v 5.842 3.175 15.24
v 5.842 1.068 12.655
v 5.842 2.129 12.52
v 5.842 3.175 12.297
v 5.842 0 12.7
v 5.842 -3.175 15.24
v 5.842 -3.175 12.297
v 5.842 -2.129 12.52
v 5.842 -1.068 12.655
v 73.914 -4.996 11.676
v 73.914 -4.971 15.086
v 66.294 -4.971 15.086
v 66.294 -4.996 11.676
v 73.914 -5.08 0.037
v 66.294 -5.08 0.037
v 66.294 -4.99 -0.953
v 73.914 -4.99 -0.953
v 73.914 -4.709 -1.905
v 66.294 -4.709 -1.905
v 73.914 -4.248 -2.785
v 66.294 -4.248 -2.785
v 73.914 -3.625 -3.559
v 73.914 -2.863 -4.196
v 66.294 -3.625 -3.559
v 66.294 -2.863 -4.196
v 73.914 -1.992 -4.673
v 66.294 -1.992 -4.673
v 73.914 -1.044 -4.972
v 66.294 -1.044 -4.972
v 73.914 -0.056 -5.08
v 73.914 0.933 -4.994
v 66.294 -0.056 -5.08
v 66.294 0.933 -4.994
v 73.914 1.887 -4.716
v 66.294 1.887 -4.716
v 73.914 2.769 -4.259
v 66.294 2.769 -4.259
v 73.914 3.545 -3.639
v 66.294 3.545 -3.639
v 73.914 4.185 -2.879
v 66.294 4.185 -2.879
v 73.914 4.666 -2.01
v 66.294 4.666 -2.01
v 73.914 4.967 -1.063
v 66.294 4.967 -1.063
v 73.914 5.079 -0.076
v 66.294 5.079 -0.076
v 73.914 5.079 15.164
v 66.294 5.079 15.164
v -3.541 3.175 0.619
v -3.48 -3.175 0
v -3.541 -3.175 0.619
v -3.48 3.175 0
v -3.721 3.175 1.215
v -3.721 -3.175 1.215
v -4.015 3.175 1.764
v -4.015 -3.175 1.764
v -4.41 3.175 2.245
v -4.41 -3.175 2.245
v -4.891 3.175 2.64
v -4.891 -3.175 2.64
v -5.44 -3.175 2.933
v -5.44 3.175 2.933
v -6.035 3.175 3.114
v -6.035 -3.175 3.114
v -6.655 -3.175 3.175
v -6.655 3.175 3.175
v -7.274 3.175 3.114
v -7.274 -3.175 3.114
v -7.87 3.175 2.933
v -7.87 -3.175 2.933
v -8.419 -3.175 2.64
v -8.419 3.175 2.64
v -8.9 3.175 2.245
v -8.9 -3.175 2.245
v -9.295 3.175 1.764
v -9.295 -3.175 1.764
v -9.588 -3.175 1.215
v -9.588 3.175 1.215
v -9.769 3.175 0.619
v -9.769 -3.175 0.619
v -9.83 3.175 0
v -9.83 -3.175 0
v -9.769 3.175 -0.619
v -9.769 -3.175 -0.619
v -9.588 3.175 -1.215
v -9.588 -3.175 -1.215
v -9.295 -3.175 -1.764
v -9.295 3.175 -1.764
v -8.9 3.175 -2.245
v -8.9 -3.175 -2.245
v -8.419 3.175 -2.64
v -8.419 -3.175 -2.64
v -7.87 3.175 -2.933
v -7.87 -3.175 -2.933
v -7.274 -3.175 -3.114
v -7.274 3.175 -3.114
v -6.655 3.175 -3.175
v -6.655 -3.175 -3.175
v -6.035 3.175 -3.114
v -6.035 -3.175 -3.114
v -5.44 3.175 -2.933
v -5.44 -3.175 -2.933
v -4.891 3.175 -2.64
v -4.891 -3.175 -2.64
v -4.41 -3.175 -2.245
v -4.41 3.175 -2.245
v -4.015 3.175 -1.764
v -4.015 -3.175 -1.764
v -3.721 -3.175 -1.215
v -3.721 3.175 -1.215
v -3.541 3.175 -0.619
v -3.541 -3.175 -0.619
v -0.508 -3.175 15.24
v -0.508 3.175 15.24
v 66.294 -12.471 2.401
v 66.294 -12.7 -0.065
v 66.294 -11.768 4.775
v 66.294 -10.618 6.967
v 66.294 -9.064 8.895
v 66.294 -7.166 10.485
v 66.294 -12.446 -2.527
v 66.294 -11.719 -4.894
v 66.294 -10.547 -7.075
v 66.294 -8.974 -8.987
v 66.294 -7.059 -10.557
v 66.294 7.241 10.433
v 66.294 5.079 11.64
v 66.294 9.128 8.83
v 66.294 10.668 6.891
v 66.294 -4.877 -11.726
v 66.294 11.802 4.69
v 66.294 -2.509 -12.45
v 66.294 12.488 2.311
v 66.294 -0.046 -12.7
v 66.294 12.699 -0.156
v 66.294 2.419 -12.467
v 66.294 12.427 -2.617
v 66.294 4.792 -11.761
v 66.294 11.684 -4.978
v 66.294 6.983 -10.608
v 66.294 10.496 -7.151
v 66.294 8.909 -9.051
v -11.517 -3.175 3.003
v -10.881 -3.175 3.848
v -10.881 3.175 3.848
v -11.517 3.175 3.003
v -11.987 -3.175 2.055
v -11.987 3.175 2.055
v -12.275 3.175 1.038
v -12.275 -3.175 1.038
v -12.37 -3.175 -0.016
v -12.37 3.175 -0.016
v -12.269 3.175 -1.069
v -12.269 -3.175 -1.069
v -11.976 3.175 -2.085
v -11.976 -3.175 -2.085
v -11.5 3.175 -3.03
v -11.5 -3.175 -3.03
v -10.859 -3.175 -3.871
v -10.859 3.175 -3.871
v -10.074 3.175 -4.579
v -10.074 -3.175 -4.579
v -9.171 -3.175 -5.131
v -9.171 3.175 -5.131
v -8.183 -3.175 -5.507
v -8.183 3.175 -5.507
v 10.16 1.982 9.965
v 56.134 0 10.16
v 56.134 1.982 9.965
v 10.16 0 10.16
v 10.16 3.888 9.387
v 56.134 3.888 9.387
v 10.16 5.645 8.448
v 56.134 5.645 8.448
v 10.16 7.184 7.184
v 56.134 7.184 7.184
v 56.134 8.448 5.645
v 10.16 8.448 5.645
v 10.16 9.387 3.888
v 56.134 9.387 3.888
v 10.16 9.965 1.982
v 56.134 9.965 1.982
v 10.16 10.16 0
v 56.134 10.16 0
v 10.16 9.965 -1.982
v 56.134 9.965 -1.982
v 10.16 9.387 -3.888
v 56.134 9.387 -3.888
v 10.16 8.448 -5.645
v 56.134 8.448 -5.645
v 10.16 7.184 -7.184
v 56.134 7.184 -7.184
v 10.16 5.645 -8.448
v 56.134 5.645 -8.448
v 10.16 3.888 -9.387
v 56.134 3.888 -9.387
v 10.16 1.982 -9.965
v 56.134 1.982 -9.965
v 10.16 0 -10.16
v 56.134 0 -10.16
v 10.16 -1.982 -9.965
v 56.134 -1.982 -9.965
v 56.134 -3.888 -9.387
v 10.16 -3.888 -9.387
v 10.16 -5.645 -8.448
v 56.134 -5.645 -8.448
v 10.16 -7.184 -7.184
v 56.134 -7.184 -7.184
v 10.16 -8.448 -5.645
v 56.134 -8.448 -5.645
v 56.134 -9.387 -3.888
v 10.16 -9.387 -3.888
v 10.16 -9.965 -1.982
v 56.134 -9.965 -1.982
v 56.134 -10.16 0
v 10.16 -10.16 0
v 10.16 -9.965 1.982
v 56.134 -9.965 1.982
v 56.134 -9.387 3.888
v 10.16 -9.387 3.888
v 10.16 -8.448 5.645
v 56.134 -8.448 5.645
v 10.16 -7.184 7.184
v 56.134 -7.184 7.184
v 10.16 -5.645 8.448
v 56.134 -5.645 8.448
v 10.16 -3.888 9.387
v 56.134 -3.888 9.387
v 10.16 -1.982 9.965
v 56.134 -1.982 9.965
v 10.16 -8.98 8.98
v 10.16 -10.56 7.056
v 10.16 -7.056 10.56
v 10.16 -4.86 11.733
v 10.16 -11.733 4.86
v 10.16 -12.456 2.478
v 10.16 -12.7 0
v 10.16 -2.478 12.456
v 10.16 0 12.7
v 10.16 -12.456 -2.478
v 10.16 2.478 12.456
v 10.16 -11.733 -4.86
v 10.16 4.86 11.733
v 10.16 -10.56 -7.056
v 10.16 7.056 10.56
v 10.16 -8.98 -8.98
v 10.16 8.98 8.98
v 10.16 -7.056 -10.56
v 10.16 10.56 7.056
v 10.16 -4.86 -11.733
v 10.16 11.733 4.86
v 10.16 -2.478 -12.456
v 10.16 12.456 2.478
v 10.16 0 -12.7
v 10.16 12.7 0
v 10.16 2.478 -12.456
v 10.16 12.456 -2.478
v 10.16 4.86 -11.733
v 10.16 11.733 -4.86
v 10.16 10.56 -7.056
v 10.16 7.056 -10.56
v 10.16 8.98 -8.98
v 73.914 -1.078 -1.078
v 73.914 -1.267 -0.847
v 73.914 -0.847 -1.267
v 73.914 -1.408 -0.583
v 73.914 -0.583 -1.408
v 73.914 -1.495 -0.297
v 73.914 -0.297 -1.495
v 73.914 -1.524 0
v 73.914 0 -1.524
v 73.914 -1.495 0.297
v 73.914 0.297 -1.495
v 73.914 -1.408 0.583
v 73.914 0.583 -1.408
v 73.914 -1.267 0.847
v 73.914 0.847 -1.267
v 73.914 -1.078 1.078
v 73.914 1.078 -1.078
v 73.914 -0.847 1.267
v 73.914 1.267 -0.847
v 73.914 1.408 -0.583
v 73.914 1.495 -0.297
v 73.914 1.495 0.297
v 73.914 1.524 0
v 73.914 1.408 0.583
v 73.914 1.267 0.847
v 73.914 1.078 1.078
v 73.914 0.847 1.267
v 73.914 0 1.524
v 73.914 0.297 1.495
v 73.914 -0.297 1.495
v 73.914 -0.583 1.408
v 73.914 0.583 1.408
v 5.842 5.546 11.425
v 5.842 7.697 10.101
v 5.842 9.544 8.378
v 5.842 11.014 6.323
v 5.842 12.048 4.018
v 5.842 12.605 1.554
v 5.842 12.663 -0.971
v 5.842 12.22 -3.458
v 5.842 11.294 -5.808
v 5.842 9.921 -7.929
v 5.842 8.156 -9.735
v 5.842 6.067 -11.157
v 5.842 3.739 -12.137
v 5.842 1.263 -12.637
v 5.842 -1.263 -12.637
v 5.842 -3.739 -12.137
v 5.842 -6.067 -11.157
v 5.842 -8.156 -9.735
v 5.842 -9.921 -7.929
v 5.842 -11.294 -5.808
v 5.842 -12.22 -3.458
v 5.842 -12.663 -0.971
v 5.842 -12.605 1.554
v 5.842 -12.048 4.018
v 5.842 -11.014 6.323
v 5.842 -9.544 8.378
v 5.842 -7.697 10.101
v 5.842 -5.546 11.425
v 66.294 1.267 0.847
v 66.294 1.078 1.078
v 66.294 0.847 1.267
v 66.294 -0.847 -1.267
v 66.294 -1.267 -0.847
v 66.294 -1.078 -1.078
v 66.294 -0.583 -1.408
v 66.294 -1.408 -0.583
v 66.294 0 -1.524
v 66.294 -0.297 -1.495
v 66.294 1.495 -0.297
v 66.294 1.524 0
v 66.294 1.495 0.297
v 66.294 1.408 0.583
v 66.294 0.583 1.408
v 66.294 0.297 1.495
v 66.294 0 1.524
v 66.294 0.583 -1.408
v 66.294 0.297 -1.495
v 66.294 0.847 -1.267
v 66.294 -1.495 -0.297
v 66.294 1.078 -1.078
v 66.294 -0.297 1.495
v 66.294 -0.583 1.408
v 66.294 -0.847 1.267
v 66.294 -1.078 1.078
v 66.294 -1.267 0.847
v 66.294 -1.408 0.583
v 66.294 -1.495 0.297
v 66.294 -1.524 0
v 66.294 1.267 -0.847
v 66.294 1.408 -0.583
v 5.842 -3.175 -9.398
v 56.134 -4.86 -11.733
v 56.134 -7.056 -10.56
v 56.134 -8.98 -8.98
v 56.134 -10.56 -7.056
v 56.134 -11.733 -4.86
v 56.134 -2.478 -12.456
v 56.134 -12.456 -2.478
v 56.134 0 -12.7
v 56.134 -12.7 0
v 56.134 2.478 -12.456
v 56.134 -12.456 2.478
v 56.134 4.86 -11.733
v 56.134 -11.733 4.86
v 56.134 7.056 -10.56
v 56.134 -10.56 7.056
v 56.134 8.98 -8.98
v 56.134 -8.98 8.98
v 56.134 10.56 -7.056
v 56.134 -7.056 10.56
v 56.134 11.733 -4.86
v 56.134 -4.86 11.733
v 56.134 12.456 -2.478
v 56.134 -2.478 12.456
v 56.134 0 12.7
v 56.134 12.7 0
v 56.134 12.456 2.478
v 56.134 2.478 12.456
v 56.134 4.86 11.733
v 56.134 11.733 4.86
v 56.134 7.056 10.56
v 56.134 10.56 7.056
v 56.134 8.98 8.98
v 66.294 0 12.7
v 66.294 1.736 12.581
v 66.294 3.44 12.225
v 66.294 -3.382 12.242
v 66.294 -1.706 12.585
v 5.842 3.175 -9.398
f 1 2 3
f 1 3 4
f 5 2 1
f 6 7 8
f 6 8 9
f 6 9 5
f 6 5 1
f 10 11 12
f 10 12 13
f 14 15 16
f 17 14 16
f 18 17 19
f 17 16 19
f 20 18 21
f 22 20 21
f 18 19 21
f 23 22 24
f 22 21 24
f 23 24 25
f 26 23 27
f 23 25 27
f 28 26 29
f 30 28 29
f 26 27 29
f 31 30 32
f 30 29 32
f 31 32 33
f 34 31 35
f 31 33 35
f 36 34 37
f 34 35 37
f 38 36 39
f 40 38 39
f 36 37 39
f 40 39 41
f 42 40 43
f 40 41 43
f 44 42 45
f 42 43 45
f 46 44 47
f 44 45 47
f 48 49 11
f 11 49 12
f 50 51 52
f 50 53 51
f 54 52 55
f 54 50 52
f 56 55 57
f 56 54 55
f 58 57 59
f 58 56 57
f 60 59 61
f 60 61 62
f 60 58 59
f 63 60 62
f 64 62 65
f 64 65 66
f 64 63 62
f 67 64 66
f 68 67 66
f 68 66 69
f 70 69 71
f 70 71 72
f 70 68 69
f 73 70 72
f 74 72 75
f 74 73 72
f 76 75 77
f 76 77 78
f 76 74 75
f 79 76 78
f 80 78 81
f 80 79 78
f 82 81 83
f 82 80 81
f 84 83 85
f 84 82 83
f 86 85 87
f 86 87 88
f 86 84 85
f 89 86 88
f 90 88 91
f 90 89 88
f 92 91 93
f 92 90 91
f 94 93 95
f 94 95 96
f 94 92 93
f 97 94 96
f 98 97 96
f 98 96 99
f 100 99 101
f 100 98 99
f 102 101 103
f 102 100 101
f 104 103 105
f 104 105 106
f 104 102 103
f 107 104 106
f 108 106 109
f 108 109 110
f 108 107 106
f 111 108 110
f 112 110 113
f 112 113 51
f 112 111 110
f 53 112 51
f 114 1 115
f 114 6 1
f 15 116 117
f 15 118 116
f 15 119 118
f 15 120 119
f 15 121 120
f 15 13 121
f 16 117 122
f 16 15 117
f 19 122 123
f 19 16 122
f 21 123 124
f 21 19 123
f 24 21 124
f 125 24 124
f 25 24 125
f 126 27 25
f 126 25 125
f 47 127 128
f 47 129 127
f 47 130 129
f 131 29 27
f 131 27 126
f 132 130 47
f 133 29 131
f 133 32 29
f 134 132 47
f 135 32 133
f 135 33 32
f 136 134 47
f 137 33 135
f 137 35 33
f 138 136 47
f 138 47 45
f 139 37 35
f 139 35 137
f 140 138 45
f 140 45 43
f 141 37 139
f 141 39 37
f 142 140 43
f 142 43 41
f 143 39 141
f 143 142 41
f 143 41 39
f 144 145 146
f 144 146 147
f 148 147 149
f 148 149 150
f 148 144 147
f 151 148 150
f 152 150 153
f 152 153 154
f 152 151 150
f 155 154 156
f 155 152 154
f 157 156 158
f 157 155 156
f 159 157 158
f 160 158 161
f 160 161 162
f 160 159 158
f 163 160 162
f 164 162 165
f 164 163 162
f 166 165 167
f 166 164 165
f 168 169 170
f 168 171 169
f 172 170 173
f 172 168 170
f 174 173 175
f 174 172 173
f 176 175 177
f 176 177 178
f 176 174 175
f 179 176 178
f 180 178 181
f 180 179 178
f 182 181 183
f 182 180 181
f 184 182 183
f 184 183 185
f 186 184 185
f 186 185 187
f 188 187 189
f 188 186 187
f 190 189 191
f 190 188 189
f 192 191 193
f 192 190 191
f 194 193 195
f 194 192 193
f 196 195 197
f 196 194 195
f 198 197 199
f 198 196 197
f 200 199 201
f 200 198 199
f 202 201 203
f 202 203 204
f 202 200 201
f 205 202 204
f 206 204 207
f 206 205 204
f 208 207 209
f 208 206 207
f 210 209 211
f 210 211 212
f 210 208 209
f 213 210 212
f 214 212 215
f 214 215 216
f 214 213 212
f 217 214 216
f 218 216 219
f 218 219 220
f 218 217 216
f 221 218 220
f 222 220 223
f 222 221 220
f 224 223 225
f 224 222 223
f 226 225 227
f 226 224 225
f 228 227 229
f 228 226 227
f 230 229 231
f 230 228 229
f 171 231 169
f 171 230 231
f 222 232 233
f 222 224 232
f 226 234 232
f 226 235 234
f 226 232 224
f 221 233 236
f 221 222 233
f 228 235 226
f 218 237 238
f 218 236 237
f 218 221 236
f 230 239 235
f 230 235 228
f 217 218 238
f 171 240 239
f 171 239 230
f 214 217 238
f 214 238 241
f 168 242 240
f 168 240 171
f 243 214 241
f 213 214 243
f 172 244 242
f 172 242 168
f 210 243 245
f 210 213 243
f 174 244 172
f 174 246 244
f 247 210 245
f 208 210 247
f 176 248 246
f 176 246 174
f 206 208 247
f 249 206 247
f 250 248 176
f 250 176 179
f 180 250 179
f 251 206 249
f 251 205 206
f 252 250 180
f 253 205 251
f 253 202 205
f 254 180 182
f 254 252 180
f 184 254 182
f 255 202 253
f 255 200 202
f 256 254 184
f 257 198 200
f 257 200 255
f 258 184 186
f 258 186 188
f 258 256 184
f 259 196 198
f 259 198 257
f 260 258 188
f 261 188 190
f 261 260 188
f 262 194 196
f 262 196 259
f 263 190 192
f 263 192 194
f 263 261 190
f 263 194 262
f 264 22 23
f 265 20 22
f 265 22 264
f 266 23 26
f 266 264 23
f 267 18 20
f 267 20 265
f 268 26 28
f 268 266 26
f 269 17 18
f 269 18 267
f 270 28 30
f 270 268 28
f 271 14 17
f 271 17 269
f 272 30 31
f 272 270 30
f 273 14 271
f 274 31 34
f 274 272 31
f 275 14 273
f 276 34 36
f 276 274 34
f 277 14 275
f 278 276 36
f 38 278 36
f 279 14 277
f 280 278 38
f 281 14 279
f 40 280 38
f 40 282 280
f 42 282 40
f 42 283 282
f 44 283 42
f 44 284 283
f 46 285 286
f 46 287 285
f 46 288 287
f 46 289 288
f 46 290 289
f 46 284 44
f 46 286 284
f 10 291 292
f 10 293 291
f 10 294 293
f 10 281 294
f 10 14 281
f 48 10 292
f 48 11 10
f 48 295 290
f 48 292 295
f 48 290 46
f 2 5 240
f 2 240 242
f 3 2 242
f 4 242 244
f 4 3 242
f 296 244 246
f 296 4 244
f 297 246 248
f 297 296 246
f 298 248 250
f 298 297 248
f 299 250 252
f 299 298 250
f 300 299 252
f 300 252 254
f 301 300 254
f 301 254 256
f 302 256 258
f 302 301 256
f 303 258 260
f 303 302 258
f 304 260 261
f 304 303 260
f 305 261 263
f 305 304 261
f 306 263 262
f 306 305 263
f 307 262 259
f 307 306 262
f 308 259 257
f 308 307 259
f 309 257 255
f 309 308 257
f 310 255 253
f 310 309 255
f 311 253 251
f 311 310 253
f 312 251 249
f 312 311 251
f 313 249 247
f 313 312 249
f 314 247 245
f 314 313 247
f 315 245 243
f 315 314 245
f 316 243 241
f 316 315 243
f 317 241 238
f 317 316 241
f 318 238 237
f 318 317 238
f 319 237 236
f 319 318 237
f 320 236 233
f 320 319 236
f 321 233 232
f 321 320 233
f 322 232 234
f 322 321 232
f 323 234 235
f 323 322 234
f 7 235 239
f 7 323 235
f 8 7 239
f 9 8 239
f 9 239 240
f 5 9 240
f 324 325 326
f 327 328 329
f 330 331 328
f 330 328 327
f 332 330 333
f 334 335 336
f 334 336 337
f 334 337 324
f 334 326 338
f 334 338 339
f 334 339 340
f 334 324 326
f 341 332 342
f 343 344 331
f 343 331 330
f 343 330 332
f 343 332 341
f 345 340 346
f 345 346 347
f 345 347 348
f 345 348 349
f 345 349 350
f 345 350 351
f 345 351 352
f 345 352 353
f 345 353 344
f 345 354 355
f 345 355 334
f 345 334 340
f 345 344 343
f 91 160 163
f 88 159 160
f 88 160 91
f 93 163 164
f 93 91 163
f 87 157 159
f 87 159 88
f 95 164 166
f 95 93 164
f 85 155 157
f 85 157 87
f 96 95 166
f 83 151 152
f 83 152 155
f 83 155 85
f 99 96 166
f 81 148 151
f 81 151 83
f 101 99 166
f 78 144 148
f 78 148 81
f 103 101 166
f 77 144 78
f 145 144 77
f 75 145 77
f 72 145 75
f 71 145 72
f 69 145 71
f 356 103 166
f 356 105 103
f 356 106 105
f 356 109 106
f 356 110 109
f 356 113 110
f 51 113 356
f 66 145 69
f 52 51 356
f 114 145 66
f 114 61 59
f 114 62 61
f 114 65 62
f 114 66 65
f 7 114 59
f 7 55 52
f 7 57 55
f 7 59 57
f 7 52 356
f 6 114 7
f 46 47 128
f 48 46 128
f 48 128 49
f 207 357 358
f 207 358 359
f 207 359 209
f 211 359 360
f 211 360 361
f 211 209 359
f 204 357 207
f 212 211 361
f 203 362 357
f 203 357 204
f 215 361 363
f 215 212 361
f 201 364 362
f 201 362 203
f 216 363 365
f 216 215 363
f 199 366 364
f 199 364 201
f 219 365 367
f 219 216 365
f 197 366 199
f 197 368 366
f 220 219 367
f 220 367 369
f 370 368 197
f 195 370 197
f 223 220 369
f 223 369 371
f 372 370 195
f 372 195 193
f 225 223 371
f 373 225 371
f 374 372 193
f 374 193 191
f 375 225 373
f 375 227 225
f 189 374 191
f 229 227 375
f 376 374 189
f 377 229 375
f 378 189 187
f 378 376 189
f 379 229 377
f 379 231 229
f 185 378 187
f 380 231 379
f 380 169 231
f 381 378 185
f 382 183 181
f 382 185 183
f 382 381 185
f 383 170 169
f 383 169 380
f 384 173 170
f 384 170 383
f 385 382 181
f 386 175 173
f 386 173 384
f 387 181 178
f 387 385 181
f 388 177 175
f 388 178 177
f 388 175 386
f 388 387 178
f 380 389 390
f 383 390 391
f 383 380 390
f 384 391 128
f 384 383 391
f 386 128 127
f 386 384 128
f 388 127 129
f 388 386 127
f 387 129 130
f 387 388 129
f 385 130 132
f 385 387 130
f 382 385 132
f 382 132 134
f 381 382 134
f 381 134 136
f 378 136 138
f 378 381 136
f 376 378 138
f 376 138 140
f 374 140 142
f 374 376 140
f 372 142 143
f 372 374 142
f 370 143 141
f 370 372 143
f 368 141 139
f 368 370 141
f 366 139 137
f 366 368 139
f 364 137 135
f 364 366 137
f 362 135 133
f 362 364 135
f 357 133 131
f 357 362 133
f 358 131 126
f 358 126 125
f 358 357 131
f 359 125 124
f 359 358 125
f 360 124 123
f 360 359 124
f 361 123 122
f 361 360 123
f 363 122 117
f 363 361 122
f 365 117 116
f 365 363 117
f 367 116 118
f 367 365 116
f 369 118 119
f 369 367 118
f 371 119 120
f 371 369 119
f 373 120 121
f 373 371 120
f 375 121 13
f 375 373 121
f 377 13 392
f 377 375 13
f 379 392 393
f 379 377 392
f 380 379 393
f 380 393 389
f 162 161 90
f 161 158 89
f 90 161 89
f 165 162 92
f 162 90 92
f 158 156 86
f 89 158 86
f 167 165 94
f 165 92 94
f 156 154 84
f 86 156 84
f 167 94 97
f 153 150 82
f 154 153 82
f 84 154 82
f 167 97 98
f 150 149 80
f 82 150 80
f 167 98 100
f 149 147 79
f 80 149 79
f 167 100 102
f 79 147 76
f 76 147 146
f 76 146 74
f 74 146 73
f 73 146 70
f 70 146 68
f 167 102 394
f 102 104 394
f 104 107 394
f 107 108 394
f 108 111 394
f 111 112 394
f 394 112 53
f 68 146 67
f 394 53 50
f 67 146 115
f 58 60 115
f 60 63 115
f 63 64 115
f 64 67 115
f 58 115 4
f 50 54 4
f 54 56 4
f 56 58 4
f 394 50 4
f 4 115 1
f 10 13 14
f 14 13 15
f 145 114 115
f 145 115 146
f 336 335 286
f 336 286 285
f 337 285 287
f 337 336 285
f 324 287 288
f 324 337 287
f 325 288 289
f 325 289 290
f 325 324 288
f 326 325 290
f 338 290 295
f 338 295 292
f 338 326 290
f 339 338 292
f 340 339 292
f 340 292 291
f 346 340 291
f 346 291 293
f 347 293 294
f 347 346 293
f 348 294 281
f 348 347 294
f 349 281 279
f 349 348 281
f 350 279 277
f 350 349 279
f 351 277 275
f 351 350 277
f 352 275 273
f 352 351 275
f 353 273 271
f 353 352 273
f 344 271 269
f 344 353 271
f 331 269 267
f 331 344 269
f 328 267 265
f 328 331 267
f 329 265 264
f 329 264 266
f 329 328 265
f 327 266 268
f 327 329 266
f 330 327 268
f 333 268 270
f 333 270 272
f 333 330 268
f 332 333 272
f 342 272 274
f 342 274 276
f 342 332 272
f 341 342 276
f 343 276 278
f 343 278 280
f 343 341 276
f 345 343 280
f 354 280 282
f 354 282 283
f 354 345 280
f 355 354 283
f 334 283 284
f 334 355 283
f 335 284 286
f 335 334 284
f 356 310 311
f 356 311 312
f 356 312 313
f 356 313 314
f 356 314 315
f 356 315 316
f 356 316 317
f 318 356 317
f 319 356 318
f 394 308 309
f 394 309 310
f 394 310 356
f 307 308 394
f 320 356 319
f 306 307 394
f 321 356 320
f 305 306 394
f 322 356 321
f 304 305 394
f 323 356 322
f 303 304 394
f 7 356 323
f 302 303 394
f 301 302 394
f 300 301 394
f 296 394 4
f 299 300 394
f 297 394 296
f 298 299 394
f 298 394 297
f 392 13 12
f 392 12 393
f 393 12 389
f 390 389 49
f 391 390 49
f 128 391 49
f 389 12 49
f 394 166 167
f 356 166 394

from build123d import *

# Parameters (mm, degrees)
F0_W     = 5.842
F0_H     = 12.7
F0_R     = 3.175
F2_DEPTH = 3.175
F3_R     = 1.524
F4_DEPTH = 7.62


with BuildPart() as f1:
    # F0 (on Front) → F1 (revolve)
    with BuildSketch(Plane.XZ):
        Polygon((5.842, 12.7), (5.842, 0), (66.294, 0), (66.294, 12.7), (56.134, 12.7), (56.134, 10.16), (10.16, 10.16), (10.16, 12.7), align=None)
    revolve(axis=Axis((33.147, 0, 0), (-1, 0, 0)))

    # F0 (on Front) → F2 (join, symmetric)
    with BuildSketch(Plane.XZ):
        with Locations((2.921, 6.35)):
            Rectangle(F0_W, F0_H)
        with BuildLine():
            Line((-0.9398, 0), (0, 0))
            Line((0, 0), (0, 12.7))
            Line((0, 12.7), (5.842, 12.7))
            Line((5.842, 12.7), (5.842, 15.24))
            Line((5.842, 15.24), (-0.508, 15.24))
            Line((-0.508, 15.24), (-10.8806298187, 3.8475430269))
            ThreePointArc((-10.8806298187, 3.8475430269), (-4.5919612295, 5.3297205562), (-0.9398, 0))
        make_face()
        with BuildLine():
            ThreePointArc((-8.1826630726, -5.5069827884), (-3.1957909266, -4.5493385486), (-0.9398, 0))
            ThreePointArc((-0.9398, 0), (-4.5919612295, 5.3297205562), (-10.8806298187, 3.8475430269))
            ThreePointArc((-10.8806298187, 3.8475430269), (-12.1459778134, -1.5837270034), (-8.1826630726, -5.5069827884))
        make_face()
        with Locations((-6.6548, 0)):
            Circle(F0_R, mode=Mode.SUBTRACT)
        with BuildLine():
            Line((5.842, 0), (0, 0))
            Line((0, 0), (-0.9398, 0))
            ThreePointArc((-0.9398, 0), (-3.1957909266, -4.5493385486), (-8.1826630726, -5.5069827884))
            Line((-8.1826630726, -5.5069827884), (5.842, -9.398))
            Line((5.842, -9.398), (5.842, 0))
        make_face()
    extrude(amount=F2_DEPTH, both=True)

    # F3 (on face) → F4 (join)
    with BuildSketch(Plane.YZ.offset(66.294)):
        with BuildLine():
            Line((-4.9956931261, 11.6761744673), (-5.0798671661, 0.0367365628))
            ThreePointArc((-5.0798671661, 0.0367365628), (-0.0197170397, 5.0799617359), (5.0794289447, 0.0761682073))
            Line((5.0794289447, 0.0761682073), (5.0794289447, 11.6399914775))
            ThreePointArc((5.0794289447, 11.6399914775), (0.0456094729, 12.6999181012), (-4.9956931261, 11.6761744673))
        make_face()
        with BuildLine():
            ThreePointArc((5.0794289447, 0.0761682073), (-0.0197170397, 5.0799617359), (-5.0798671661, 0.0367365628))
            ThreePointArc((-5.0798671661, 0.0367365628), (-0.0564528103, -5.0796863171), (5.0794289447, -0.0761682073))
            Line((5.0794289447, -0.0761682073), (5.0794289447, 0.0761682073))
        make_face()
        Circle(F3_R, mode=Mode.SUBTRACT)
        with BuildLine():
            Line((-4.9710357562, 15.0857521221), (-4.9956931261, 11.6761744673))
            ThreePointArc((-4.9956931261, 11.6761744673), (0.0456094729, 12.6999181012), (5.0794289447, 11.6399914775))
            Line((5.0794289447, 11.6399914775), (5.0794289447, 15.1638317927))
            Line((5.0794289447, 15.1638317927), (-4.9710357562, 15.0857521221))
        make_face()
    extrude(amount=F4_DEPTH)


solid = f1.part
